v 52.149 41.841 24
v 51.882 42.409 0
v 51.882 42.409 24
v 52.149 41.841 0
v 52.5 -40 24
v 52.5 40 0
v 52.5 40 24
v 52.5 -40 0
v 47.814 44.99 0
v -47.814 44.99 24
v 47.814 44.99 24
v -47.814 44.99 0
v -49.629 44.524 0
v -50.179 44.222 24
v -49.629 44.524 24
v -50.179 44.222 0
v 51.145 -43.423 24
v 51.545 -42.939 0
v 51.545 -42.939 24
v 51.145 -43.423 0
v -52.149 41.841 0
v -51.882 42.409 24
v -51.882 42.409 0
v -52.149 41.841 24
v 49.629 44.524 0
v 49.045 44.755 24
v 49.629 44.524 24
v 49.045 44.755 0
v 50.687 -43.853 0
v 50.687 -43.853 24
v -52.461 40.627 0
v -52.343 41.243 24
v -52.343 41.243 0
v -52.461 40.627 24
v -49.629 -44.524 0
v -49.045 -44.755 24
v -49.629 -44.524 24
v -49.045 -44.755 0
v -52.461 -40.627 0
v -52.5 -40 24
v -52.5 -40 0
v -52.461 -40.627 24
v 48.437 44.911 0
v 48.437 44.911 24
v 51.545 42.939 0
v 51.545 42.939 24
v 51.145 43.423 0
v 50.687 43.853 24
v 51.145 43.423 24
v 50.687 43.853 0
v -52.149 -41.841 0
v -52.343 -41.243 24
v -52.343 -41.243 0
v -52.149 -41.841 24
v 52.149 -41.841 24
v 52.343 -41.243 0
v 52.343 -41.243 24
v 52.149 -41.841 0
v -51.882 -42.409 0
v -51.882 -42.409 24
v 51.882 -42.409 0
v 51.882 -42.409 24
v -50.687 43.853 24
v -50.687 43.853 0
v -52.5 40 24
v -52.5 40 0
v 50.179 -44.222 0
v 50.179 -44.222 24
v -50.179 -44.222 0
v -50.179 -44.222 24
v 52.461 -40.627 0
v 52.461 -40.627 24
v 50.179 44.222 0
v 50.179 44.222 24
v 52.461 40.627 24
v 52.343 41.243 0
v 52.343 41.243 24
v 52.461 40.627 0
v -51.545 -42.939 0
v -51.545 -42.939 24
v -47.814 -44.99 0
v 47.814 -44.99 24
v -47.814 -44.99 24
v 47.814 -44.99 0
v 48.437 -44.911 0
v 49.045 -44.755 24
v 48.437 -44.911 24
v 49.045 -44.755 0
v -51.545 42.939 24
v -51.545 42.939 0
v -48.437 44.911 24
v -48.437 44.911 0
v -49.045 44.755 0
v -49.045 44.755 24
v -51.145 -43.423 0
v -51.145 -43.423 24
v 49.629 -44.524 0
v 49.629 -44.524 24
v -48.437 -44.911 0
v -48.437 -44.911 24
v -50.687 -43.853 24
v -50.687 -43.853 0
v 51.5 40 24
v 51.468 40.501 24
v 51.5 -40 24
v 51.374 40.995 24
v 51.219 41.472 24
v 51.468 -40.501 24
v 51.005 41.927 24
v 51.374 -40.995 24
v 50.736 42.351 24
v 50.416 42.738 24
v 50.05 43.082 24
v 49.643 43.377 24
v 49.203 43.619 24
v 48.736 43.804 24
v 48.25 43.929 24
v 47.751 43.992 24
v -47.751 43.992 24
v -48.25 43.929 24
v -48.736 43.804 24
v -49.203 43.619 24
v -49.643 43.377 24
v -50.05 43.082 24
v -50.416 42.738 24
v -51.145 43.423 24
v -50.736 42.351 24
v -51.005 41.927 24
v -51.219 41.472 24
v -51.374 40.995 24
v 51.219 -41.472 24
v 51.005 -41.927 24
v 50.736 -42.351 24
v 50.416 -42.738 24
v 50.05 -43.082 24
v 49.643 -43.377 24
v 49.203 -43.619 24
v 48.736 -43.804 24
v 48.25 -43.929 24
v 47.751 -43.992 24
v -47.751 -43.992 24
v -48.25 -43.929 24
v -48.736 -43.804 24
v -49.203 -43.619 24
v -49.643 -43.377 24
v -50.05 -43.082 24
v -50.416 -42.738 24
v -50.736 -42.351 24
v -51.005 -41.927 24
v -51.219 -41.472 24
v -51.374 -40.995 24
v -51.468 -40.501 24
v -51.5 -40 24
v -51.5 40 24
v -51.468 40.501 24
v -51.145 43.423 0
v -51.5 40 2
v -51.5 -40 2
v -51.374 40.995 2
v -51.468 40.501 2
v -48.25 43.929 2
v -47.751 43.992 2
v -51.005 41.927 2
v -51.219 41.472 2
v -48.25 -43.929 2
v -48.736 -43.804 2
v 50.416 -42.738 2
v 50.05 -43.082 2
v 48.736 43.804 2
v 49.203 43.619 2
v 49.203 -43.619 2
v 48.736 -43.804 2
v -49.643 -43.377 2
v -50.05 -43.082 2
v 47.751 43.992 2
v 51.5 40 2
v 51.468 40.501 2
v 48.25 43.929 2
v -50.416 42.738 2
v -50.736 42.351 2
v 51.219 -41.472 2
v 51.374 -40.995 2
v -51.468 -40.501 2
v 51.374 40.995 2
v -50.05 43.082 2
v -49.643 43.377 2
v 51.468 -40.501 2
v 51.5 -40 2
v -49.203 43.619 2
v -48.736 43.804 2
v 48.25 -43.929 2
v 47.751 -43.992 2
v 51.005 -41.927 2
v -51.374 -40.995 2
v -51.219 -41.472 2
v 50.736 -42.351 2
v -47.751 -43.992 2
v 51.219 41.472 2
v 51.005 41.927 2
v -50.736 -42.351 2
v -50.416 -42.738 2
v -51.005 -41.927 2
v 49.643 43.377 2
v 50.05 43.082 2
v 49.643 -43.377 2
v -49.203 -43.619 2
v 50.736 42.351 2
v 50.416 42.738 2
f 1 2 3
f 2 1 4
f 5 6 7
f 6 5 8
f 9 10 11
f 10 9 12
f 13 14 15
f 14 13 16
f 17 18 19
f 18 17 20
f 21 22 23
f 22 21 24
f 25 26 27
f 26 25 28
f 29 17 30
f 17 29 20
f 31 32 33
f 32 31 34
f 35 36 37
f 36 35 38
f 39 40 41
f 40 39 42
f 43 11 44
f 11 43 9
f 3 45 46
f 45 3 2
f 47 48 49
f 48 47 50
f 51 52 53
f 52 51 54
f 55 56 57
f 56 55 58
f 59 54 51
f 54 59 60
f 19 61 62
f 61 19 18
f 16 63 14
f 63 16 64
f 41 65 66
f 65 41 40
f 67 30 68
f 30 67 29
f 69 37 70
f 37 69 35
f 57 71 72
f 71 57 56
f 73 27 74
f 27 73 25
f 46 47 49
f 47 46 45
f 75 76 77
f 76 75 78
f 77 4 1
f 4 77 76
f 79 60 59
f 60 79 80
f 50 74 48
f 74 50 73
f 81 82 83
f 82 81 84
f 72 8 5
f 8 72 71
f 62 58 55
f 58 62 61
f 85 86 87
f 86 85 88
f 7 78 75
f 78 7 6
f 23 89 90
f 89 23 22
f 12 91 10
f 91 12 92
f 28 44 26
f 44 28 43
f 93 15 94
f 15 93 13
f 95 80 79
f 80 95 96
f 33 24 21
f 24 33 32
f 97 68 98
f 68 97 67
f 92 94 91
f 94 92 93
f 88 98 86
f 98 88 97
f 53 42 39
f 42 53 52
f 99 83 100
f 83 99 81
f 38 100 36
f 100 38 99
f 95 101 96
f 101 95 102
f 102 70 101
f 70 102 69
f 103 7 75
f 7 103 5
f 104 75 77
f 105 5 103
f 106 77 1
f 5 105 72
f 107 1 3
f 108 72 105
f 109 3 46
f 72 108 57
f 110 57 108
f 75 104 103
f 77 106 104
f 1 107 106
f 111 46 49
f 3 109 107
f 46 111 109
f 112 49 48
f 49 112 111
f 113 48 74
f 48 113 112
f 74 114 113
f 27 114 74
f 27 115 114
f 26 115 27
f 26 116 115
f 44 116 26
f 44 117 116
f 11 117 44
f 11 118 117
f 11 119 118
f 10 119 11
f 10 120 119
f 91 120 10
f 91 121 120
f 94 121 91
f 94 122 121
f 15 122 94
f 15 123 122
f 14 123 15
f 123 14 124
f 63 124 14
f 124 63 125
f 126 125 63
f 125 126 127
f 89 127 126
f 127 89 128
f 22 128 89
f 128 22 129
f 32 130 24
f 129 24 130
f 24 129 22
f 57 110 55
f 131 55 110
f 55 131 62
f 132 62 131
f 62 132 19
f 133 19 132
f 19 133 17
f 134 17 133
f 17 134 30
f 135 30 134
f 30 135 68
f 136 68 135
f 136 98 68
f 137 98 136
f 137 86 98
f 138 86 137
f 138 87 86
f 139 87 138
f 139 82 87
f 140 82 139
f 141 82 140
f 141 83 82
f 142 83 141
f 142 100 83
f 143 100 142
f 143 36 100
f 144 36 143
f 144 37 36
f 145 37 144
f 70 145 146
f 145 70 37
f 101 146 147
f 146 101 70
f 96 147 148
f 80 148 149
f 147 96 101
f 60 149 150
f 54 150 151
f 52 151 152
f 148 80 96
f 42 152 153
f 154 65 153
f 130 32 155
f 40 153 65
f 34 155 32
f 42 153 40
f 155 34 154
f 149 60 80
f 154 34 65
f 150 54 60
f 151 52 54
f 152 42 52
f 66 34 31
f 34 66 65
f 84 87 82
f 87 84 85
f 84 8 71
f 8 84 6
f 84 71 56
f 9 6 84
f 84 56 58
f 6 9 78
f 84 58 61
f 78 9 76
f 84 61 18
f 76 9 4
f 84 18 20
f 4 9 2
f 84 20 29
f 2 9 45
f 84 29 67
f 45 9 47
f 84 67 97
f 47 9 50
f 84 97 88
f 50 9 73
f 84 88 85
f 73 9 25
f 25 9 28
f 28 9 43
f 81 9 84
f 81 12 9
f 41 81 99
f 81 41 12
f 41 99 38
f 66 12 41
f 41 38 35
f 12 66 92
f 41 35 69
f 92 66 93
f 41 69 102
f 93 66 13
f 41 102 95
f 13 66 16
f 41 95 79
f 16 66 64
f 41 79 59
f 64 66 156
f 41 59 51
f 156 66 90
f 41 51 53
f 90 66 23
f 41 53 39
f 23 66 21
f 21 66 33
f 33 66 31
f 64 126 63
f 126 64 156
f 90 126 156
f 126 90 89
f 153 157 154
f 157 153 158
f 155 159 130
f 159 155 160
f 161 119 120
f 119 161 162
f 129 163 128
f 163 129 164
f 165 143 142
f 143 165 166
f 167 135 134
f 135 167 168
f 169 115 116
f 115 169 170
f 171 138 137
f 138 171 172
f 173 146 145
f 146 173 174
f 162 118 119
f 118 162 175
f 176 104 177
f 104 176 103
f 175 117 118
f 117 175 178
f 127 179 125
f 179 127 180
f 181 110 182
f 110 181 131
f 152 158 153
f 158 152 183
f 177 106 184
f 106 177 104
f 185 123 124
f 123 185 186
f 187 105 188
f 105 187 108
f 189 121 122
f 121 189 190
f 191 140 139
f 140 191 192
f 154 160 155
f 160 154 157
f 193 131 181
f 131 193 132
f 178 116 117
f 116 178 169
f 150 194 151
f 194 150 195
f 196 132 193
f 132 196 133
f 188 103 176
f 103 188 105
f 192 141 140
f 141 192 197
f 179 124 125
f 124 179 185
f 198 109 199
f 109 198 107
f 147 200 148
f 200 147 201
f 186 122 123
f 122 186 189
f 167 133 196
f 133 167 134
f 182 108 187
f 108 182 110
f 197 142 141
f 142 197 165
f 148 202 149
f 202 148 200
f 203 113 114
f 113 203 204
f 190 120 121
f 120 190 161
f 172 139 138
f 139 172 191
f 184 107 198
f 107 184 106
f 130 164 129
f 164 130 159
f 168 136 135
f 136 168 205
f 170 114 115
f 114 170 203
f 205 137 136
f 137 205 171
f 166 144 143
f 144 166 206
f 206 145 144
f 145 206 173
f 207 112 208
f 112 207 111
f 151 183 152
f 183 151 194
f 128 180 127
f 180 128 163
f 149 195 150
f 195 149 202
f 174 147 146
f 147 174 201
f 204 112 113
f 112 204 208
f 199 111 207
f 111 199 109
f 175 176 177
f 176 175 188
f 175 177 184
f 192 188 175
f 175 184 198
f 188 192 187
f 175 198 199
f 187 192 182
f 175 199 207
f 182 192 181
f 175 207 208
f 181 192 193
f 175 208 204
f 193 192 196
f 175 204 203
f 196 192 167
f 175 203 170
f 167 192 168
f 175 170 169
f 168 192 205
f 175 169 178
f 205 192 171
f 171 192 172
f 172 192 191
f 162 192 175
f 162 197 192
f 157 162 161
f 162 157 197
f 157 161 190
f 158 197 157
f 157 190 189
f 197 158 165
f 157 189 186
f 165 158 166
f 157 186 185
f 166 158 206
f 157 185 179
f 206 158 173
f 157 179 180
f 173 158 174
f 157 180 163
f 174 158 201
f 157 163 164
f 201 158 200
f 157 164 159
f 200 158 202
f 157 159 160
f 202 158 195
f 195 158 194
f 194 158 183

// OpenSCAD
$fn = 50;


difference() {
	union() {
		hull() {
			translate(v = [-47.5000000000, 40.0000000000, 0]) {
				cylinder(h = 24, r = 5);
			}
			translate(v = [47.5000000000, 40.0000000000, 0]) {
				cylinder(h = 24, r = 5);
			}
			translate(v = [-47.5000000000, -40.0000000000, 0]) {
				cylinder(h = 24, r = 5);
			}
			translate(v = [47.5000000000, -40.0000000000, 0]) {
				cylinder(h = 24, r = 5);
			}
		}
	}
	union() {
		translate(v = [0, 0, 2]) {
			hull() {
				translate(v = [-47.5000000000, 40.0000000000, 0]) {
					cylinder(h = 22, r = 4);
				}
				translate(v = [47.5000000000, 40.0000000000, 0]) {
					cylinder(h = 22, r = 4);
				}
				translate(v = [-47.5000000000, -40.0000000000, 0]) {
					cylinder(h = 22, r = 4);
				}
				translate(v = [47.5000000000, -40.0000000000, 0]) {
					cylinder(h = 22, r = 4);
				}
			}
		}
	}
}
